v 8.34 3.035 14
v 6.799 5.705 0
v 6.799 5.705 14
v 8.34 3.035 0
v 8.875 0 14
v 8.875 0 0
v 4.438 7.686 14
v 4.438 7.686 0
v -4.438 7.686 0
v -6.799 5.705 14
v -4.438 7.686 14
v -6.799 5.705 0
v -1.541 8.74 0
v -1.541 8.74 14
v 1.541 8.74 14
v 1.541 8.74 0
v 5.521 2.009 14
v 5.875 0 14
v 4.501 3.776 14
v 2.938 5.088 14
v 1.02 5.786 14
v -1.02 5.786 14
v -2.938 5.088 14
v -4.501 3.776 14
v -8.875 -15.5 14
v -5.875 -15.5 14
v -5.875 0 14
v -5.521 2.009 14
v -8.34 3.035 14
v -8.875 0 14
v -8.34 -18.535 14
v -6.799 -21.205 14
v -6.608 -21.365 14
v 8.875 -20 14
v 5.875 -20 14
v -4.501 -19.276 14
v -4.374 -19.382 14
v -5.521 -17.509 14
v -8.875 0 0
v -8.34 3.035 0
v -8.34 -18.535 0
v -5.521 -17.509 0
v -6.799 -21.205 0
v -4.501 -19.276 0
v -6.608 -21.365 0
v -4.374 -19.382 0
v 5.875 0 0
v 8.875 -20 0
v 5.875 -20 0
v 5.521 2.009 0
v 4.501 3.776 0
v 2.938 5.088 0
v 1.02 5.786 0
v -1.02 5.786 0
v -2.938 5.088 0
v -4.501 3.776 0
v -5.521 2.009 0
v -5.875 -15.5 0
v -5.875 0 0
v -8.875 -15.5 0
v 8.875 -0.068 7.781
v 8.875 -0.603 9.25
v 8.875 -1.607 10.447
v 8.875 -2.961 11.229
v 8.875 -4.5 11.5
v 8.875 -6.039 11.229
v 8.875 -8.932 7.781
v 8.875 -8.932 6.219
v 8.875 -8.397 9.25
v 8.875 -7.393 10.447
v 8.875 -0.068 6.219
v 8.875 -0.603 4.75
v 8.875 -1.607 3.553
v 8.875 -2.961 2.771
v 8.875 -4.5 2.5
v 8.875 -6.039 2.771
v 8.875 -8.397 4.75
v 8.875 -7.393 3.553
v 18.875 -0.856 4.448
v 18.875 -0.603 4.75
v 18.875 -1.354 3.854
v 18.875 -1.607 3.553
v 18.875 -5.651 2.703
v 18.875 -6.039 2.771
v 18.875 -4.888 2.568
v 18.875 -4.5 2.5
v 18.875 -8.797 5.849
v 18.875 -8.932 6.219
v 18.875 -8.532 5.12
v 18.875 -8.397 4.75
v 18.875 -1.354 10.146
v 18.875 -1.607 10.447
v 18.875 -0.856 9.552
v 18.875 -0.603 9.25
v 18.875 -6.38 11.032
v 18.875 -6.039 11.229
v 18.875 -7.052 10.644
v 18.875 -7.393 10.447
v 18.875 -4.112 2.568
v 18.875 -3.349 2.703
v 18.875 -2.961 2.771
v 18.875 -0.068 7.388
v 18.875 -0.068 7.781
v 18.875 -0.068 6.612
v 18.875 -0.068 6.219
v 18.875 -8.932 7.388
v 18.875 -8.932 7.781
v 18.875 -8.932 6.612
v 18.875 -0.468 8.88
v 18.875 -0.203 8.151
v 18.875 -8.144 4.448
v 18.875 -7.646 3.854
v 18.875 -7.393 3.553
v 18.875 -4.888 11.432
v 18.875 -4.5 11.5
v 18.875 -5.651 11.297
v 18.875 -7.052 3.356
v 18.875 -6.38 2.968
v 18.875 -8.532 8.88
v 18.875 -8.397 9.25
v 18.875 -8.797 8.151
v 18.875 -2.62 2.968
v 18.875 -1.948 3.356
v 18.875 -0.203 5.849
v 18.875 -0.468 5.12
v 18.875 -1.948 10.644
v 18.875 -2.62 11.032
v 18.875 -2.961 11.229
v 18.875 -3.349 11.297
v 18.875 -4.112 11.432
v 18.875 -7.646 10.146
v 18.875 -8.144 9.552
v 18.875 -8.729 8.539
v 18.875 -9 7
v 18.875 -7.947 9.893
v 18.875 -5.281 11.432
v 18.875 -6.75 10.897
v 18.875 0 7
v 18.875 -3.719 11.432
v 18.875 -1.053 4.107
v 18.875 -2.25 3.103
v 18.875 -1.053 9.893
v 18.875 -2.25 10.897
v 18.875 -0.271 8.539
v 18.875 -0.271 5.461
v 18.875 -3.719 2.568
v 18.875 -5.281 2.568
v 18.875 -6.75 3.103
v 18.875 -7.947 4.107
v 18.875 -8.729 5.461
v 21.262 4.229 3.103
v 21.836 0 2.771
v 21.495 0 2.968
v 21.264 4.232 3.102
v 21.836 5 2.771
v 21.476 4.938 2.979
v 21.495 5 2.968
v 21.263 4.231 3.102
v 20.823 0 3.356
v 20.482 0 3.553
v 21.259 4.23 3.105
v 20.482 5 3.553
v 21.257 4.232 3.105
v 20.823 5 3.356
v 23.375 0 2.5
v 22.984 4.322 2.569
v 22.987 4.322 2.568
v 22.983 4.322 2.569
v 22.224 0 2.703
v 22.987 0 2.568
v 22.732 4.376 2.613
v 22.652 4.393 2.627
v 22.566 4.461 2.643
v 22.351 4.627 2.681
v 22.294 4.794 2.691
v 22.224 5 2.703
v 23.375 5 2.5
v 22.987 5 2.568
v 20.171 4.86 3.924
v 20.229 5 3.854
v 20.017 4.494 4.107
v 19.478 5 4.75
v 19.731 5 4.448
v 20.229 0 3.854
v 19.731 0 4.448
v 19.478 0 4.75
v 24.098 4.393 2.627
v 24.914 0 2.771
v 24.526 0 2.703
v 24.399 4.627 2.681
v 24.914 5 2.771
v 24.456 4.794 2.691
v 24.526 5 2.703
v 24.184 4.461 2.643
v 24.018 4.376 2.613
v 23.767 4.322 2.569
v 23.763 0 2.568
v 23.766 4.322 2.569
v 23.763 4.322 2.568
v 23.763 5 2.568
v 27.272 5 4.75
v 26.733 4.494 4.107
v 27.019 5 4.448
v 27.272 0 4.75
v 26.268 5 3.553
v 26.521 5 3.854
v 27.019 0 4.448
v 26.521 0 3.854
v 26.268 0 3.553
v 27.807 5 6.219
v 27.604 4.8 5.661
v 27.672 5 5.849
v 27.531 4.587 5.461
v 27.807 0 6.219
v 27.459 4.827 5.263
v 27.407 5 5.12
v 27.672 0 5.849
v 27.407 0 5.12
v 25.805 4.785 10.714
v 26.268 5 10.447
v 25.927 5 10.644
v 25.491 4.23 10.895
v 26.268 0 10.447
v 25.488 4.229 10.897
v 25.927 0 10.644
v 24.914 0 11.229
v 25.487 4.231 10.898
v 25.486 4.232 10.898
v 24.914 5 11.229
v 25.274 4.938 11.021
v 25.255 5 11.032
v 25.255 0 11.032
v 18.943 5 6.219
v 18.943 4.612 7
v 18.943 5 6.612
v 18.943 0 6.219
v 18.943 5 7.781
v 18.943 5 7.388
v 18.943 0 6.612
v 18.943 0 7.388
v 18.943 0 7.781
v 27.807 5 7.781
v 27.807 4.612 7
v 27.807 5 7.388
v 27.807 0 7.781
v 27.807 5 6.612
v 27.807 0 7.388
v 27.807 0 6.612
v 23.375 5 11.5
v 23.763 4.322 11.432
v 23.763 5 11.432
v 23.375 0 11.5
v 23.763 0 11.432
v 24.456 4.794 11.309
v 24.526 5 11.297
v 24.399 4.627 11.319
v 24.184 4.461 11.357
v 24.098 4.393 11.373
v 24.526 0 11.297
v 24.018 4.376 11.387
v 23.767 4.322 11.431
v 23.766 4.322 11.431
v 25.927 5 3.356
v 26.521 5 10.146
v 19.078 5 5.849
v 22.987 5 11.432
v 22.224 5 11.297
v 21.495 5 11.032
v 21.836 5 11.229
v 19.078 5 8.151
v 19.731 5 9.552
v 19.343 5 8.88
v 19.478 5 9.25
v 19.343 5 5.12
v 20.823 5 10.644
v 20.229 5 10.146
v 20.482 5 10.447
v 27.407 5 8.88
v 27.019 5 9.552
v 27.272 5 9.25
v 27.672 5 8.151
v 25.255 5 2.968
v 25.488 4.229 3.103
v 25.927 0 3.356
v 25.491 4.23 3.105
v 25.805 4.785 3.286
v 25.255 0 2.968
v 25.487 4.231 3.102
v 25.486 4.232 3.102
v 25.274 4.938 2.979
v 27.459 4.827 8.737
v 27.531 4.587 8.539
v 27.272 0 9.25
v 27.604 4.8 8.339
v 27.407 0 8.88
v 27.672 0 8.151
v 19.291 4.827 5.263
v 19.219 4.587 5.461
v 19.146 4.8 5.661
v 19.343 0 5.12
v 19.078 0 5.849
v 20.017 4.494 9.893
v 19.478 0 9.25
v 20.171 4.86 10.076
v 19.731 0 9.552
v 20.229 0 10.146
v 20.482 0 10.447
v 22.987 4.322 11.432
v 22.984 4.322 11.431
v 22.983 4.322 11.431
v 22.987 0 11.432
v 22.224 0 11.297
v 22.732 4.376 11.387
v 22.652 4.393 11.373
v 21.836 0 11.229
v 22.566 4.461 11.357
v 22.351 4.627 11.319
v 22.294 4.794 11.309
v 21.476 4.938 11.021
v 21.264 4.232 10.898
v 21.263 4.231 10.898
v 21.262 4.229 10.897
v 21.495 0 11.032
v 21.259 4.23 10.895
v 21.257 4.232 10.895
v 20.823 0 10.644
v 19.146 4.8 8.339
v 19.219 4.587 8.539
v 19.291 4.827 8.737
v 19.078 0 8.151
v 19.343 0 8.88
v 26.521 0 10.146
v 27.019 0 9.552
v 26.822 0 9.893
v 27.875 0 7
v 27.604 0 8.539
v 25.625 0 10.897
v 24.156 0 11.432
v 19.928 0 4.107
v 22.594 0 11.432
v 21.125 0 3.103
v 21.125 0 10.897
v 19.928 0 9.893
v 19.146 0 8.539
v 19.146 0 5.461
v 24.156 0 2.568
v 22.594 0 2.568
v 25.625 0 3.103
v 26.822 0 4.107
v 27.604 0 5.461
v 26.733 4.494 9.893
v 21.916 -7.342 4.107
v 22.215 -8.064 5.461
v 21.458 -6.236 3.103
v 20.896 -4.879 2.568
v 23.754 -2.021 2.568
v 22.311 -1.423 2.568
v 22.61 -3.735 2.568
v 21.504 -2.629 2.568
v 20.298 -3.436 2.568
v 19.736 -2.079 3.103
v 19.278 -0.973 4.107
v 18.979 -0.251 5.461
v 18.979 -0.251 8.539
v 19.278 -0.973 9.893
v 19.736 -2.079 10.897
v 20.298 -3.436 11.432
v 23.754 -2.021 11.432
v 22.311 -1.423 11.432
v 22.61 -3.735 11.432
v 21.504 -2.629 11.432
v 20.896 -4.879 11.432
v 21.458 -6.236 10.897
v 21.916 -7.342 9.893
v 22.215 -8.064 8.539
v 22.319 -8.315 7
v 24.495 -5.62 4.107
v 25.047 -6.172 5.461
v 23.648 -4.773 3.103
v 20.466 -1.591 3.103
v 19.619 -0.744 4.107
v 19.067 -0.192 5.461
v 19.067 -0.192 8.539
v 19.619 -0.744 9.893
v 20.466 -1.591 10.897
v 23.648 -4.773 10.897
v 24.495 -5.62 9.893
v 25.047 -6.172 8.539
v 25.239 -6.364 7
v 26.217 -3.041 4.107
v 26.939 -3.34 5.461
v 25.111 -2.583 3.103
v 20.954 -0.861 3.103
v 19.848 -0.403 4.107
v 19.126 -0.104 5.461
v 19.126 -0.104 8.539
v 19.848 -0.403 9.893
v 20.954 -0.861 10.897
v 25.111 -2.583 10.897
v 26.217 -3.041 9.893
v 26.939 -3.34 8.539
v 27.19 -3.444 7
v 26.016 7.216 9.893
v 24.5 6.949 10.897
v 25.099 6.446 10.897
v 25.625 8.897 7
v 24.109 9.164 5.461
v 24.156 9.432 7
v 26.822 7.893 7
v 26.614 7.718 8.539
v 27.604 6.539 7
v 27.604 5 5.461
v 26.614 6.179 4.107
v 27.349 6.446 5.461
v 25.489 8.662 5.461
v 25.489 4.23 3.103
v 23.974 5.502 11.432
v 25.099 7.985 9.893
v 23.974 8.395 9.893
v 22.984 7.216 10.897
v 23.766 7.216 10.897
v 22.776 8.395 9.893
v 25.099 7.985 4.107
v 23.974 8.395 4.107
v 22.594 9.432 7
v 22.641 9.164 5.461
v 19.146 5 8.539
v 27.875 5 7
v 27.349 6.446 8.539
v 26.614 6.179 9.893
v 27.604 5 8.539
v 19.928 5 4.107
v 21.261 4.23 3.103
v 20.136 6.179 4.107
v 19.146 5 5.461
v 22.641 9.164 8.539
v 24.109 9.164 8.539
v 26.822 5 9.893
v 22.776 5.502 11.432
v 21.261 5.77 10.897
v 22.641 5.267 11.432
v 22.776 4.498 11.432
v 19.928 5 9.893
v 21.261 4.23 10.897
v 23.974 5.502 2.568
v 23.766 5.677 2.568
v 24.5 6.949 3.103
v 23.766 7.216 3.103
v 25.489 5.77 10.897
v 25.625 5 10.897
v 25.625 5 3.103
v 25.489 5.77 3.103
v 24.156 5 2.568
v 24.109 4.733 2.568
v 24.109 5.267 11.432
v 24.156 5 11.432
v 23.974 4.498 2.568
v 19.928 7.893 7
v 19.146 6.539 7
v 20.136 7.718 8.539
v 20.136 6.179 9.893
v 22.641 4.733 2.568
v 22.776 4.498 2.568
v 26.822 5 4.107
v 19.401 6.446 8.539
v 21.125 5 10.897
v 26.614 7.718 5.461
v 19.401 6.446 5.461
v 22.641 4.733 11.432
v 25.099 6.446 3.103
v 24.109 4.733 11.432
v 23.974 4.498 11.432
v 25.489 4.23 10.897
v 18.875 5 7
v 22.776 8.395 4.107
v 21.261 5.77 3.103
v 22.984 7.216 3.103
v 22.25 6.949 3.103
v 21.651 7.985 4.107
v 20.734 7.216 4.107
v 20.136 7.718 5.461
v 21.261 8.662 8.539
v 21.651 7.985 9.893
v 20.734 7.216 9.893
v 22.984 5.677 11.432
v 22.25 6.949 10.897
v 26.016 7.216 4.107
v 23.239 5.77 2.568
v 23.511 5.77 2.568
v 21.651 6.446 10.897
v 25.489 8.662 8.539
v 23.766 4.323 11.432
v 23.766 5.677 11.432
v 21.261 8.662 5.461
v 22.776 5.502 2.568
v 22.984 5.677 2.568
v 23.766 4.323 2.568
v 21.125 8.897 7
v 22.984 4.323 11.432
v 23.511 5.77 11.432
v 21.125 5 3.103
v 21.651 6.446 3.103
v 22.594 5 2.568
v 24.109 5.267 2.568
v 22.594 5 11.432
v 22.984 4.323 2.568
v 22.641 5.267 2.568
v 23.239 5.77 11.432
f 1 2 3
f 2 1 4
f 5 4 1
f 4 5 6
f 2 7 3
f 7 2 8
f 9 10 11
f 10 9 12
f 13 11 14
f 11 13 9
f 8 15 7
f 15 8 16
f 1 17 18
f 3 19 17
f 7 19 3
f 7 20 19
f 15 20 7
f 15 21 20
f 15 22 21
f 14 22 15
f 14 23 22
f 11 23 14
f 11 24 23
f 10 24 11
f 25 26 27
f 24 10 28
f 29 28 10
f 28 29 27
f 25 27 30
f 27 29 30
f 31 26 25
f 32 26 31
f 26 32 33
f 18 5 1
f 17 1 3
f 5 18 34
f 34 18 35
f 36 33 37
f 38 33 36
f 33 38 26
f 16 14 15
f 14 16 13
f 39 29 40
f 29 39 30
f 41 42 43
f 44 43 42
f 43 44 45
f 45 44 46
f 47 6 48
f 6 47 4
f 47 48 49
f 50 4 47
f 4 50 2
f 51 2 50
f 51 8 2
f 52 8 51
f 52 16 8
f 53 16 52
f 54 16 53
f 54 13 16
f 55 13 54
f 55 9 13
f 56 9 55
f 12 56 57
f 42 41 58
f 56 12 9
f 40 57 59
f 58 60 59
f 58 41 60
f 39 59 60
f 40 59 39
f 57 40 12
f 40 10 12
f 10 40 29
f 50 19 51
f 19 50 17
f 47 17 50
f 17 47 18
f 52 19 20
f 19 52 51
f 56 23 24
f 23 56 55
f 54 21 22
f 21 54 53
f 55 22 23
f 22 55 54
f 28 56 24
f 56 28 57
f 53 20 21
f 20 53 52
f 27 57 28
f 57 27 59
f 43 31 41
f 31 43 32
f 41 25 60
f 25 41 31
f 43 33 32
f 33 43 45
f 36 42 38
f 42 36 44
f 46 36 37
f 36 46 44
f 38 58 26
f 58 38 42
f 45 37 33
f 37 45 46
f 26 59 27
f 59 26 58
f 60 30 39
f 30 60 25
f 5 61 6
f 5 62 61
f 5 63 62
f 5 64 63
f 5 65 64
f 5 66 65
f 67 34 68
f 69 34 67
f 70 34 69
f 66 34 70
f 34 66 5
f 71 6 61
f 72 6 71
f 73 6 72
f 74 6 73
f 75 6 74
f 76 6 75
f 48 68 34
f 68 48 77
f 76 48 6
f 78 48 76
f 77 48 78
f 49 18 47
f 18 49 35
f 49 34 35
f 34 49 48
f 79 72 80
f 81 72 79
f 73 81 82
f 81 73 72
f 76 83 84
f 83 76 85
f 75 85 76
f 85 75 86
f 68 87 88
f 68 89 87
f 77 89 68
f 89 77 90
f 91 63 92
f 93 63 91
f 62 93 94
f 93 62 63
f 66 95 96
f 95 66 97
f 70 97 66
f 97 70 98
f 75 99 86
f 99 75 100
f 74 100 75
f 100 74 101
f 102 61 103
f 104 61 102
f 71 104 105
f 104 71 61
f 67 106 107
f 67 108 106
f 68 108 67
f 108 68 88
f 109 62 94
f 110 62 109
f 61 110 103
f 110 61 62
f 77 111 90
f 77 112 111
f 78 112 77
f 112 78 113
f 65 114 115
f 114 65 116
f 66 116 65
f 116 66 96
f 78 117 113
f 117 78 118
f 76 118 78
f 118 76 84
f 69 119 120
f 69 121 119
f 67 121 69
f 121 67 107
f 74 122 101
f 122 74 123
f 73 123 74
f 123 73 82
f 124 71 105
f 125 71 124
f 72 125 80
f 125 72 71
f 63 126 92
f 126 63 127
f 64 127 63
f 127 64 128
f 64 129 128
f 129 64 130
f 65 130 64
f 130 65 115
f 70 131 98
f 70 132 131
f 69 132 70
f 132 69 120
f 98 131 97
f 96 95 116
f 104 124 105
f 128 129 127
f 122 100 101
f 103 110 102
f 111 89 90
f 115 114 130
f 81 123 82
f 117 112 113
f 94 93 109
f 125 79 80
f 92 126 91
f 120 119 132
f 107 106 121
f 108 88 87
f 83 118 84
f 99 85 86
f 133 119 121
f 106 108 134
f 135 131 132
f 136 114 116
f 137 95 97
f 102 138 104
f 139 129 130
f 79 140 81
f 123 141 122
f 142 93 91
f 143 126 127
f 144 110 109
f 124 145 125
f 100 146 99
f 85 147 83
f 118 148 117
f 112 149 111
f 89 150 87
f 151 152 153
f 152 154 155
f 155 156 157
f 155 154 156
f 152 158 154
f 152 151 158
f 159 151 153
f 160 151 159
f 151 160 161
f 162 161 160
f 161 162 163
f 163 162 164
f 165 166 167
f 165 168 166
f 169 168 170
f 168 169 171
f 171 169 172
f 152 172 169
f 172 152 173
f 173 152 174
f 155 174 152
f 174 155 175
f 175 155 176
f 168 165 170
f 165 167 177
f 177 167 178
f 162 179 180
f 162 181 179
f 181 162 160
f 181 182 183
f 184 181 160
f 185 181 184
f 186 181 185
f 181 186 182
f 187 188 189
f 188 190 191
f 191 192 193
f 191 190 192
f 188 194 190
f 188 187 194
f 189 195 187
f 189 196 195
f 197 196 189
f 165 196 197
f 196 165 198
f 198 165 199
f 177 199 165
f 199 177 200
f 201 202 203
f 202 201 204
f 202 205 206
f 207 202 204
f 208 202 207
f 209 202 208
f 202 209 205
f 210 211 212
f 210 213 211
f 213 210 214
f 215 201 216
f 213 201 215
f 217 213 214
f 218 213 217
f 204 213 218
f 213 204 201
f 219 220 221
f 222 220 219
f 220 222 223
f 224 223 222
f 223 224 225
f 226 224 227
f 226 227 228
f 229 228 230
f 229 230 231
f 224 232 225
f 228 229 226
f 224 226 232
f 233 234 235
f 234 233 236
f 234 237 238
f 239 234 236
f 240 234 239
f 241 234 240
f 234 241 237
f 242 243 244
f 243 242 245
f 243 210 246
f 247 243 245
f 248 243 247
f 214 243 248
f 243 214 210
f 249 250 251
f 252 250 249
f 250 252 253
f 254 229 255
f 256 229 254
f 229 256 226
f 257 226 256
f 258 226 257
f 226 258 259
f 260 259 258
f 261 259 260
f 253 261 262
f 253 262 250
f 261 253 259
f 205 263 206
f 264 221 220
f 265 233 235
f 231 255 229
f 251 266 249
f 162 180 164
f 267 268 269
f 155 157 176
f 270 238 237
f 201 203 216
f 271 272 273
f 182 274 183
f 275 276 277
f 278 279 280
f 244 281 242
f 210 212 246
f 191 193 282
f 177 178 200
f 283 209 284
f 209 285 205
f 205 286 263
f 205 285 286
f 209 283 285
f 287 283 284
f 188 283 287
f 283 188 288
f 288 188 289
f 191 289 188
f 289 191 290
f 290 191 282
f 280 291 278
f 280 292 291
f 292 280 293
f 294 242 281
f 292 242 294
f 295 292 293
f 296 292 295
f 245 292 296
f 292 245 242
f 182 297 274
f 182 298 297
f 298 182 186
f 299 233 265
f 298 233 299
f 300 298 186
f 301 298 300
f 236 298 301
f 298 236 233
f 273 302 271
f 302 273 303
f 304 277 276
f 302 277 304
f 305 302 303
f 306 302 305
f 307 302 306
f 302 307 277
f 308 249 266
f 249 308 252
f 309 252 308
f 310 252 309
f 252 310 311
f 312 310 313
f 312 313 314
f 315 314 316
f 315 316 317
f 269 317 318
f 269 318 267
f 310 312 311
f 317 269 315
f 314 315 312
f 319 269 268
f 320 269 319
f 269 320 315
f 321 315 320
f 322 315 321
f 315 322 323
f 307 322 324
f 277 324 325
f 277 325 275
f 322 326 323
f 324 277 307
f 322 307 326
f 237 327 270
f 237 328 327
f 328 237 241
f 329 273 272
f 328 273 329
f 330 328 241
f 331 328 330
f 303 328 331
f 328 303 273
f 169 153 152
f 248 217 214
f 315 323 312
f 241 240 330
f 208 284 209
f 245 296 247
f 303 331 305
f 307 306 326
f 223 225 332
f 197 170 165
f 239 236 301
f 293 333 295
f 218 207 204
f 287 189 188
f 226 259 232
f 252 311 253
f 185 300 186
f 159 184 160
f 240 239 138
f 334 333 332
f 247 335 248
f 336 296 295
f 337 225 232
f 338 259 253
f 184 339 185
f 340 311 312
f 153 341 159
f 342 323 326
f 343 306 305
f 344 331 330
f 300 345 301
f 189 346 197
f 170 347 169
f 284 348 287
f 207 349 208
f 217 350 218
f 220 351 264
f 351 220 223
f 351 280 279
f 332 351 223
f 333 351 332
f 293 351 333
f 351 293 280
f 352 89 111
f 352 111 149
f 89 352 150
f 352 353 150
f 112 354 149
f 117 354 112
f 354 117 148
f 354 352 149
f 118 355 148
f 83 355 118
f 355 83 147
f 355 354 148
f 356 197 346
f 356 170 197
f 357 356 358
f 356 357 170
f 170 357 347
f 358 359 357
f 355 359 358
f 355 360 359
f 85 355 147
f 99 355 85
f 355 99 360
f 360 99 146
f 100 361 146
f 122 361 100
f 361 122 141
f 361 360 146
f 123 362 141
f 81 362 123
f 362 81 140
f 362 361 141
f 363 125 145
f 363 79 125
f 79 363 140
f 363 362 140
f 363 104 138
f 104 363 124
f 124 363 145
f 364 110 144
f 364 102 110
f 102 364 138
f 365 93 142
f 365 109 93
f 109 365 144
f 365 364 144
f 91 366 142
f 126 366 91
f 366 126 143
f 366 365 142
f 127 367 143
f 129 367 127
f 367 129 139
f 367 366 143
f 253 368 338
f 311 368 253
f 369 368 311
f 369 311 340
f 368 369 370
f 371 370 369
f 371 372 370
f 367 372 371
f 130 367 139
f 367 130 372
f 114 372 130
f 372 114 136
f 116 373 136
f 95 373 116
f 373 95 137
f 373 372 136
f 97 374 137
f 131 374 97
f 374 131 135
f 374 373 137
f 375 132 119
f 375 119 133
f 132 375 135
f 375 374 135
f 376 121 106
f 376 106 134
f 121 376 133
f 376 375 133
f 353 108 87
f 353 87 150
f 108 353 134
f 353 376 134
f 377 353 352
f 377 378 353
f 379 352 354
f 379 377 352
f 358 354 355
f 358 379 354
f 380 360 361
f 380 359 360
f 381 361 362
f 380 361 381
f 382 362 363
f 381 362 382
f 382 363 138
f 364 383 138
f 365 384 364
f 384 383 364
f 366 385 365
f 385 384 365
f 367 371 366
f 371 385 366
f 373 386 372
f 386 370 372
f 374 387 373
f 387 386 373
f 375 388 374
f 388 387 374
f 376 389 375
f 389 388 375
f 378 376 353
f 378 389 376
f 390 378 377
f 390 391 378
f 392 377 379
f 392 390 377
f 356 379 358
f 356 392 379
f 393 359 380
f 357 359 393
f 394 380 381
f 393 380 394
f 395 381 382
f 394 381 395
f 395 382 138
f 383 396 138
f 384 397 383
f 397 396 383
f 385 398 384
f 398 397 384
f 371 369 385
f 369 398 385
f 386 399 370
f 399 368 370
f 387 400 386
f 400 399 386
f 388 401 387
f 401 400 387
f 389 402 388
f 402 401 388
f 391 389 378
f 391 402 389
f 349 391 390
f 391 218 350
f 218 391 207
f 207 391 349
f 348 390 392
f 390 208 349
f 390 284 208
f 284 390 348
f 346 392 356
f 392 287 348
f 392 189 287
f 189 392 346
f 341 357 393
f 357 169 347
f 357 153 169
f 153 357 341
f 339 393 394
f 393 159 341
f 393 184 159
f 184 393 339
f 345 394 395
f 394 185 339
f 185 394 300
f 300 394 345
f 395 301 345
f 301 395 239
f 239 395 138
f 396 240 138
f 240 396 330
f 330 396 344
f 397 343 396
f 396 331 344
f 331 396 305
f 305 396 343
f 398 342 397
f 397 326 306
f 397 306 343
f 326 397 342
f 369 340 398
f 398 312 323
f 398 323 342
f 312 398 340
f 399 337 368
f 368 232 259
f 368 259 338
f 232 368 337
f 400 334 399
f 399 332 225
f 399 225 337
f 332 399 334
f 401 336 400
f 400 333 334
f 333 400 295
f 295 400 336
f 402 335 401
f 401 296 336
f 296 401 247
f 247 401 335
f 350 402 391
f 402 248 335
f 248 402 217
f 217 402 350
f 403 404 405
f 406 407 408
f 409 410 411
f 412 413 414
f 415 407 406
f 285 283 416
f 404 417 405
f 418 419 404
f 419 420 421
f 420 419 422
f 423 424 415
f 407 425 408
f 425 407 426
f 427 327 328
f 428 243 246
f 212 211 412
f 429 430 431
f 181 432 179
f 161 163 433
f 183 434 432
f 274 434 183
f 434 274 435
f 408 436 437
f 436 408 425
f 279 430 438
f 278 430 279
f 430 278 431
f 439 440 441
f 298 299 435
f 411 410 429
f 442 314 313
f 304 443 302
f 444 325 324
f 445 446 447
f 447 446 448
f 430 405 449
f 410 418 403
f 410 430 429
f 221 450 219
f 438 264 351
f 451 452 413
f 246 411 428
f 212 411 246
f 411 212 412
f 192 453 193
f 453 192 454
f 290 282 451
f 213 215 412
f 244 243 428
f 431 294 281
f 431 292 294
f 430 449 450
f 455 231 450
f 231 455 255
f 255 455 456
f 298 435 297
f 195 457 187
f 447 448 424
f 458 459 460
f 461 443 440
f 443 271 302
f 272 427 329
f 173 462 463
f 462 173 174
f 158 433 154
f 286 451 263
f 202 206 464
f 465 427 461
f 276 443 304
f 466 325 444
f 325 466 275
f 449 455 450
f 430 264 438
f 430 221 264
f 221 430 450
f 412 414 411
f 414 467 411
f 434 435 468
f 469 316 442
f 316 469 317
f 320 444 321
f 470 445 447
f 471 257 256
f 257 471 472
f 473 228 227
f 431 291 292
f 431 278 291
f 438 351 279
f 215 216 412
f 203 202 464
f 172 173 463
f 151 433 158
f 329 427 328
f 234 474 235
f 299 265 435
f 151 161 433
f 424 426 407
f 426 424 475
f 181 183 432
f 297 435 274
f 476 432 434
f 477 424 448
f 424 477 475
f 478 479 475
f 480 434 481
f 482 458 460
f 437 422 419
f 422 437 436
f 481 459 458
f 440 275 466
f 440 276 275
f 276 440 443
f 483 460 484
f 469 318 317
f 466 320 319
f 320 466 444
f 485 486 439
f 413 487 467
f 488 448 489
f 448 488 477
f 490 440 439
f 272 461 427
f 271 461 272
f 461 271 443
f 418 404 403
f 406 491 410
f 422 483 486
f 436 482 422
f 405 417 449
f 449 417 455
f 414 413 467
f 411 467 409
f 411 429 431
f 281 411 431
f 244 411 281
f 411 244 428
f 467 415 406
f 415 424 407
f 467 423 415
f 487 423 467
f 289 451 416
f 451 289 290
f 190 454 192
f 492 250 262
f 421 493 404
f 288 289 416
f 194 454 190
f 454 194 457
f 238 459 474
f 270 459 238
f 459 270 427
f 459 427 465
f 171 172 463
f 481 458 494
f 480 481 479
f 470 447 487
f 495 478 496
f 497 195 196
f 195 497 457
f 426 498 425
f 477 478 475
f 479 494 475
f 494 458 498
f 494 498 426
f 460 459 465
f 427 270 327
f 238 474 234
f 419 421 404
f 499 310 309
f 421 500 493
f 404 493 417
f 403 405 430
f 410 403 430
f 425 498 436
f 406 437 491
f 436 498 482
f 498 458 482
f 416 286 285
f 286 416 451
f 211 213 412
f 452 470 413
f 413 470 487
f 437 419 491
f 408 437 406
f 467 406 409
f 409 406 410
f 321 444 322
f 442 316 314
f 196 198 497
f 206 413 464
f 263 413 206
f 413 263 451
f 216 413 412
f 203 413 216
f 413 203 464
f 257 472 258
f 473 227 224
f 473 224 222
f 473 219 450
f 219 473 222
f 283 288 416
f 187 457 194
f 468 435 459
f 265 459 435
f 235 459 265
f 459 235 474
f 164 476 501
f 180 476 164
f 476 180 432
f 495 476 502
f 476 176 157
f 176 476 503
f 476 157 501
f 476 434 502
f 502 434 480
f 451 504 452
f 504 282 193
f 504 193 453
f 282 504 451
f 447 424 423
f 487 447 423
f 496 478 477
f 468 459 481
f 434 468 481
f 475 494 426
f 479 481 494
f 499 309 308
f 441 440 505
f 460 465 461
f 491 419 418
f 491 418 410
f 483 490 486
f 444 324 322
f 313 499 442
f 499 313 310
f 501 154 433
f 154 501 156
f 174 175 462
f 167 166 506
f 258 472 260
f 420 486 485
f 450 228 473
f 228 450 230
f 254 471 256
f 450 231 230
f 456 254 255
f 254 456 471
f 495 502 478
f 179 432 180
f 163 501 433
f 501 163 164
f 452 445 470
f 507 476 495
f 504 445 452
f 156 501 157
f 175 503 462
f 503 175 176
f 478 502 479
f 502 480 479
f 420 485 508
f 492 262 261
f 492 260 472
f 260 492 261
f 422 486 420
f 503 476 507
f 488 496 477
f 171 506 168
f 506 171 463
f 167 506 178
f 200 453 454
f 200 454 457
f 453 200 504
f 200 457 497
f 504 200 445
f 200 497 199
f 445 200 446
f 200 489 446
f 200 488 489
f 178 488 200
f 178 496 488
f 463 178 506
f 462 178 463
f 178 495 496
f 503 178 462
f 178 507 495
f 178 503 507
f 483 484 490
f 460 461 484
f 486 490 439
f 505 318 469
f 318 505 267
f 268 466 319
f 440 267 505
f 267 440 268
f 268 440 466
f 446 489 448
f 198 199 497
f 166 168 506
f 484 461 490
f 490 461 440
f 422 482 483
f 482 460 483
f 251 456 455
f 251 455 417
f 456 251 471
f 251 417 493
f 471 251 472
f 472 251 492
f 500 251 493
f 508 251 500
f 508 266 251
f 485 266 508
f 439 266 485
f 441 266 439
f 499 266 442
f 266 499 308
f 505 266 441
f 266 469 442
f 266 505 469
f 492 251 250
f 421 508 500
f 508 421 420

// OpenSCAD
// clip for hanging bar above sink
// justin lowe 20201116

//11.75mm void depth for clip (part that goes around hanging bar)
//14.5 mm wide clip (looking striaght on, left to right side) not important really
//15.4mm height straight section of clip 
//27.2 clip height

//9mm diamter brush hole
//8mm height brush hole

draftingFNs = 18;
renderingFNs = 180;
currentFNs = draftingFNs;
$fn = currentFNs;

clipInnerRadius = 11.75/2;
clipWallThickness = 3;
clipOuterRadius = clipInnerRadius+clipWallThickness;
clipInnerHeight = 15.5;
clipOuterHeight = 20;

clipWidth = 14;

hangerHeight = 10;
hangerRadius = 9/2;
hangerHookHeight = 5;

polyPoints = [
  [  0,  0,  0 ],  //0
  [ 0,  0-clipOuterRadius,  0 ],  //1
  [ -10,  0-clipOuterRadius,  0 ],  //2
  [  0,  0,  clipWidth ],  //3
  [  -10,  0-clipOuterRadius,  clipWidth ],  //4
  [ 0,  0-clipOuterRadius,  clipWidth ],  //5
];
  
polyFaces = [
  [0,1,2],  // bottom
  [1,5,4,2],  // front
  [0,3,5,1],  // right
  [0,2,4,3],  // back
  [3,4,5],  // top
]; 

module hanger(){
    translate([clipOuterRadius,-hangerRadius,clipWidth/2]){
        rotate([0,90,0]){
            cylinder(hangerHeight,hangerRadius,hangerRadius);
        }
    }
    
    translate([clipOuterRadius+hangerHeight+hangerRadius,0,clipWidth/2]){
        rotate([0,90,90]){
            cylinder(hangerHookHeight,hangerRadius,hangerRadius);
        }
    }
    
    translate([clipOuterRadius+hangerHeight,0,clipWidth/2-hangerRadius]){
        rotate([0,0,-90]){
            rotate_extrude(angle = 90){
                translate([hangerRadius,hangerRadius,0]){
                    circle(hangerRadius);
                }
            }
        }
    }
    
    translate([clipOuterRadius+hangerHeight+hangerRadius,hangerHookHeight,clipWidth/2]){
        sphere(hangerRadius);
    }
} //end module
//whitespace
    

module clip(){
    difference(){
        //outer cylinder to subtract from 
        translate([0,0,0]){
            cylinder(clipWidth,clipOuterRadius,clipOuterRadius);
        }
        
        //inner cylinder to subtract
        translate([0,0,0]){
            cylinder(clipWidth,clipInnerRadius,clipInnerRadius);
        }
        
        //get rid of bottom half of cylinder/tube
        translate([-(clipOuterRadius),-(clipOuterRadius)*2,0]){
            cube([(clipOuterRadius)*2,(clipOuterRadius)*2,clipWidth]);
        }
    } //end of difference
    
    
    
    
    translate([0,-clipInnerHeight,0]){
        difference(){
            //outer cylinder to subtract from 
            translate([0,0,0]){
                cylinder(clipWidth,clipOuterRadius,clipOuterRadius);
            }
            
            //inner cylinder to subtract
            translate([0,0,0]){
                cylinder(clipWidth,clipInnerRadius,clipInnerRadius);
            }
            
            //get rid of top half of cylinder/tube
            translate([-(clipOuterRadius),0,0]){
                cube([(clipOuterRadius)*2,(clipOuterRadius)*2,clipWidth]);
            }
            
    
      
            polyhedron( polyPoints, polyFaces );
    
            //get rid of bottom half of cylinder/tube
            translate([0,-(clipOuterRadius),0]){
                cube([(clipOuterRadius),(clipOuterRadius),clipWidth]);
            }
                    
    //        //get rid of most of bottom half of cylinder/tube
    //        translate([0,-(clipOuterRadius)+0,clipWidth]){
    //            rotate([0,180,30]){
    //                cube([(clipOuterRadius),(clipOuterRadius),clipWidth]);
    //            }
    //        }
        } //end of difference
    }  
    
    //clip wall behind hanging bar
    translate([-(clipInnerRadius+clipWallThickness),-clipInnerHeight,0]){
        cube([clipWallThickness,clipInnerHeight,clipWidth]);
    }
    
    //clip wall in front of hanging bar
    translate([clipInnerRadius,-clipOuterHeight,0]){
        cube([clipWallThickness,clipOuterHeight,clipWidth]);
    }

} //end module
//whitespace



clip();
hanger();
